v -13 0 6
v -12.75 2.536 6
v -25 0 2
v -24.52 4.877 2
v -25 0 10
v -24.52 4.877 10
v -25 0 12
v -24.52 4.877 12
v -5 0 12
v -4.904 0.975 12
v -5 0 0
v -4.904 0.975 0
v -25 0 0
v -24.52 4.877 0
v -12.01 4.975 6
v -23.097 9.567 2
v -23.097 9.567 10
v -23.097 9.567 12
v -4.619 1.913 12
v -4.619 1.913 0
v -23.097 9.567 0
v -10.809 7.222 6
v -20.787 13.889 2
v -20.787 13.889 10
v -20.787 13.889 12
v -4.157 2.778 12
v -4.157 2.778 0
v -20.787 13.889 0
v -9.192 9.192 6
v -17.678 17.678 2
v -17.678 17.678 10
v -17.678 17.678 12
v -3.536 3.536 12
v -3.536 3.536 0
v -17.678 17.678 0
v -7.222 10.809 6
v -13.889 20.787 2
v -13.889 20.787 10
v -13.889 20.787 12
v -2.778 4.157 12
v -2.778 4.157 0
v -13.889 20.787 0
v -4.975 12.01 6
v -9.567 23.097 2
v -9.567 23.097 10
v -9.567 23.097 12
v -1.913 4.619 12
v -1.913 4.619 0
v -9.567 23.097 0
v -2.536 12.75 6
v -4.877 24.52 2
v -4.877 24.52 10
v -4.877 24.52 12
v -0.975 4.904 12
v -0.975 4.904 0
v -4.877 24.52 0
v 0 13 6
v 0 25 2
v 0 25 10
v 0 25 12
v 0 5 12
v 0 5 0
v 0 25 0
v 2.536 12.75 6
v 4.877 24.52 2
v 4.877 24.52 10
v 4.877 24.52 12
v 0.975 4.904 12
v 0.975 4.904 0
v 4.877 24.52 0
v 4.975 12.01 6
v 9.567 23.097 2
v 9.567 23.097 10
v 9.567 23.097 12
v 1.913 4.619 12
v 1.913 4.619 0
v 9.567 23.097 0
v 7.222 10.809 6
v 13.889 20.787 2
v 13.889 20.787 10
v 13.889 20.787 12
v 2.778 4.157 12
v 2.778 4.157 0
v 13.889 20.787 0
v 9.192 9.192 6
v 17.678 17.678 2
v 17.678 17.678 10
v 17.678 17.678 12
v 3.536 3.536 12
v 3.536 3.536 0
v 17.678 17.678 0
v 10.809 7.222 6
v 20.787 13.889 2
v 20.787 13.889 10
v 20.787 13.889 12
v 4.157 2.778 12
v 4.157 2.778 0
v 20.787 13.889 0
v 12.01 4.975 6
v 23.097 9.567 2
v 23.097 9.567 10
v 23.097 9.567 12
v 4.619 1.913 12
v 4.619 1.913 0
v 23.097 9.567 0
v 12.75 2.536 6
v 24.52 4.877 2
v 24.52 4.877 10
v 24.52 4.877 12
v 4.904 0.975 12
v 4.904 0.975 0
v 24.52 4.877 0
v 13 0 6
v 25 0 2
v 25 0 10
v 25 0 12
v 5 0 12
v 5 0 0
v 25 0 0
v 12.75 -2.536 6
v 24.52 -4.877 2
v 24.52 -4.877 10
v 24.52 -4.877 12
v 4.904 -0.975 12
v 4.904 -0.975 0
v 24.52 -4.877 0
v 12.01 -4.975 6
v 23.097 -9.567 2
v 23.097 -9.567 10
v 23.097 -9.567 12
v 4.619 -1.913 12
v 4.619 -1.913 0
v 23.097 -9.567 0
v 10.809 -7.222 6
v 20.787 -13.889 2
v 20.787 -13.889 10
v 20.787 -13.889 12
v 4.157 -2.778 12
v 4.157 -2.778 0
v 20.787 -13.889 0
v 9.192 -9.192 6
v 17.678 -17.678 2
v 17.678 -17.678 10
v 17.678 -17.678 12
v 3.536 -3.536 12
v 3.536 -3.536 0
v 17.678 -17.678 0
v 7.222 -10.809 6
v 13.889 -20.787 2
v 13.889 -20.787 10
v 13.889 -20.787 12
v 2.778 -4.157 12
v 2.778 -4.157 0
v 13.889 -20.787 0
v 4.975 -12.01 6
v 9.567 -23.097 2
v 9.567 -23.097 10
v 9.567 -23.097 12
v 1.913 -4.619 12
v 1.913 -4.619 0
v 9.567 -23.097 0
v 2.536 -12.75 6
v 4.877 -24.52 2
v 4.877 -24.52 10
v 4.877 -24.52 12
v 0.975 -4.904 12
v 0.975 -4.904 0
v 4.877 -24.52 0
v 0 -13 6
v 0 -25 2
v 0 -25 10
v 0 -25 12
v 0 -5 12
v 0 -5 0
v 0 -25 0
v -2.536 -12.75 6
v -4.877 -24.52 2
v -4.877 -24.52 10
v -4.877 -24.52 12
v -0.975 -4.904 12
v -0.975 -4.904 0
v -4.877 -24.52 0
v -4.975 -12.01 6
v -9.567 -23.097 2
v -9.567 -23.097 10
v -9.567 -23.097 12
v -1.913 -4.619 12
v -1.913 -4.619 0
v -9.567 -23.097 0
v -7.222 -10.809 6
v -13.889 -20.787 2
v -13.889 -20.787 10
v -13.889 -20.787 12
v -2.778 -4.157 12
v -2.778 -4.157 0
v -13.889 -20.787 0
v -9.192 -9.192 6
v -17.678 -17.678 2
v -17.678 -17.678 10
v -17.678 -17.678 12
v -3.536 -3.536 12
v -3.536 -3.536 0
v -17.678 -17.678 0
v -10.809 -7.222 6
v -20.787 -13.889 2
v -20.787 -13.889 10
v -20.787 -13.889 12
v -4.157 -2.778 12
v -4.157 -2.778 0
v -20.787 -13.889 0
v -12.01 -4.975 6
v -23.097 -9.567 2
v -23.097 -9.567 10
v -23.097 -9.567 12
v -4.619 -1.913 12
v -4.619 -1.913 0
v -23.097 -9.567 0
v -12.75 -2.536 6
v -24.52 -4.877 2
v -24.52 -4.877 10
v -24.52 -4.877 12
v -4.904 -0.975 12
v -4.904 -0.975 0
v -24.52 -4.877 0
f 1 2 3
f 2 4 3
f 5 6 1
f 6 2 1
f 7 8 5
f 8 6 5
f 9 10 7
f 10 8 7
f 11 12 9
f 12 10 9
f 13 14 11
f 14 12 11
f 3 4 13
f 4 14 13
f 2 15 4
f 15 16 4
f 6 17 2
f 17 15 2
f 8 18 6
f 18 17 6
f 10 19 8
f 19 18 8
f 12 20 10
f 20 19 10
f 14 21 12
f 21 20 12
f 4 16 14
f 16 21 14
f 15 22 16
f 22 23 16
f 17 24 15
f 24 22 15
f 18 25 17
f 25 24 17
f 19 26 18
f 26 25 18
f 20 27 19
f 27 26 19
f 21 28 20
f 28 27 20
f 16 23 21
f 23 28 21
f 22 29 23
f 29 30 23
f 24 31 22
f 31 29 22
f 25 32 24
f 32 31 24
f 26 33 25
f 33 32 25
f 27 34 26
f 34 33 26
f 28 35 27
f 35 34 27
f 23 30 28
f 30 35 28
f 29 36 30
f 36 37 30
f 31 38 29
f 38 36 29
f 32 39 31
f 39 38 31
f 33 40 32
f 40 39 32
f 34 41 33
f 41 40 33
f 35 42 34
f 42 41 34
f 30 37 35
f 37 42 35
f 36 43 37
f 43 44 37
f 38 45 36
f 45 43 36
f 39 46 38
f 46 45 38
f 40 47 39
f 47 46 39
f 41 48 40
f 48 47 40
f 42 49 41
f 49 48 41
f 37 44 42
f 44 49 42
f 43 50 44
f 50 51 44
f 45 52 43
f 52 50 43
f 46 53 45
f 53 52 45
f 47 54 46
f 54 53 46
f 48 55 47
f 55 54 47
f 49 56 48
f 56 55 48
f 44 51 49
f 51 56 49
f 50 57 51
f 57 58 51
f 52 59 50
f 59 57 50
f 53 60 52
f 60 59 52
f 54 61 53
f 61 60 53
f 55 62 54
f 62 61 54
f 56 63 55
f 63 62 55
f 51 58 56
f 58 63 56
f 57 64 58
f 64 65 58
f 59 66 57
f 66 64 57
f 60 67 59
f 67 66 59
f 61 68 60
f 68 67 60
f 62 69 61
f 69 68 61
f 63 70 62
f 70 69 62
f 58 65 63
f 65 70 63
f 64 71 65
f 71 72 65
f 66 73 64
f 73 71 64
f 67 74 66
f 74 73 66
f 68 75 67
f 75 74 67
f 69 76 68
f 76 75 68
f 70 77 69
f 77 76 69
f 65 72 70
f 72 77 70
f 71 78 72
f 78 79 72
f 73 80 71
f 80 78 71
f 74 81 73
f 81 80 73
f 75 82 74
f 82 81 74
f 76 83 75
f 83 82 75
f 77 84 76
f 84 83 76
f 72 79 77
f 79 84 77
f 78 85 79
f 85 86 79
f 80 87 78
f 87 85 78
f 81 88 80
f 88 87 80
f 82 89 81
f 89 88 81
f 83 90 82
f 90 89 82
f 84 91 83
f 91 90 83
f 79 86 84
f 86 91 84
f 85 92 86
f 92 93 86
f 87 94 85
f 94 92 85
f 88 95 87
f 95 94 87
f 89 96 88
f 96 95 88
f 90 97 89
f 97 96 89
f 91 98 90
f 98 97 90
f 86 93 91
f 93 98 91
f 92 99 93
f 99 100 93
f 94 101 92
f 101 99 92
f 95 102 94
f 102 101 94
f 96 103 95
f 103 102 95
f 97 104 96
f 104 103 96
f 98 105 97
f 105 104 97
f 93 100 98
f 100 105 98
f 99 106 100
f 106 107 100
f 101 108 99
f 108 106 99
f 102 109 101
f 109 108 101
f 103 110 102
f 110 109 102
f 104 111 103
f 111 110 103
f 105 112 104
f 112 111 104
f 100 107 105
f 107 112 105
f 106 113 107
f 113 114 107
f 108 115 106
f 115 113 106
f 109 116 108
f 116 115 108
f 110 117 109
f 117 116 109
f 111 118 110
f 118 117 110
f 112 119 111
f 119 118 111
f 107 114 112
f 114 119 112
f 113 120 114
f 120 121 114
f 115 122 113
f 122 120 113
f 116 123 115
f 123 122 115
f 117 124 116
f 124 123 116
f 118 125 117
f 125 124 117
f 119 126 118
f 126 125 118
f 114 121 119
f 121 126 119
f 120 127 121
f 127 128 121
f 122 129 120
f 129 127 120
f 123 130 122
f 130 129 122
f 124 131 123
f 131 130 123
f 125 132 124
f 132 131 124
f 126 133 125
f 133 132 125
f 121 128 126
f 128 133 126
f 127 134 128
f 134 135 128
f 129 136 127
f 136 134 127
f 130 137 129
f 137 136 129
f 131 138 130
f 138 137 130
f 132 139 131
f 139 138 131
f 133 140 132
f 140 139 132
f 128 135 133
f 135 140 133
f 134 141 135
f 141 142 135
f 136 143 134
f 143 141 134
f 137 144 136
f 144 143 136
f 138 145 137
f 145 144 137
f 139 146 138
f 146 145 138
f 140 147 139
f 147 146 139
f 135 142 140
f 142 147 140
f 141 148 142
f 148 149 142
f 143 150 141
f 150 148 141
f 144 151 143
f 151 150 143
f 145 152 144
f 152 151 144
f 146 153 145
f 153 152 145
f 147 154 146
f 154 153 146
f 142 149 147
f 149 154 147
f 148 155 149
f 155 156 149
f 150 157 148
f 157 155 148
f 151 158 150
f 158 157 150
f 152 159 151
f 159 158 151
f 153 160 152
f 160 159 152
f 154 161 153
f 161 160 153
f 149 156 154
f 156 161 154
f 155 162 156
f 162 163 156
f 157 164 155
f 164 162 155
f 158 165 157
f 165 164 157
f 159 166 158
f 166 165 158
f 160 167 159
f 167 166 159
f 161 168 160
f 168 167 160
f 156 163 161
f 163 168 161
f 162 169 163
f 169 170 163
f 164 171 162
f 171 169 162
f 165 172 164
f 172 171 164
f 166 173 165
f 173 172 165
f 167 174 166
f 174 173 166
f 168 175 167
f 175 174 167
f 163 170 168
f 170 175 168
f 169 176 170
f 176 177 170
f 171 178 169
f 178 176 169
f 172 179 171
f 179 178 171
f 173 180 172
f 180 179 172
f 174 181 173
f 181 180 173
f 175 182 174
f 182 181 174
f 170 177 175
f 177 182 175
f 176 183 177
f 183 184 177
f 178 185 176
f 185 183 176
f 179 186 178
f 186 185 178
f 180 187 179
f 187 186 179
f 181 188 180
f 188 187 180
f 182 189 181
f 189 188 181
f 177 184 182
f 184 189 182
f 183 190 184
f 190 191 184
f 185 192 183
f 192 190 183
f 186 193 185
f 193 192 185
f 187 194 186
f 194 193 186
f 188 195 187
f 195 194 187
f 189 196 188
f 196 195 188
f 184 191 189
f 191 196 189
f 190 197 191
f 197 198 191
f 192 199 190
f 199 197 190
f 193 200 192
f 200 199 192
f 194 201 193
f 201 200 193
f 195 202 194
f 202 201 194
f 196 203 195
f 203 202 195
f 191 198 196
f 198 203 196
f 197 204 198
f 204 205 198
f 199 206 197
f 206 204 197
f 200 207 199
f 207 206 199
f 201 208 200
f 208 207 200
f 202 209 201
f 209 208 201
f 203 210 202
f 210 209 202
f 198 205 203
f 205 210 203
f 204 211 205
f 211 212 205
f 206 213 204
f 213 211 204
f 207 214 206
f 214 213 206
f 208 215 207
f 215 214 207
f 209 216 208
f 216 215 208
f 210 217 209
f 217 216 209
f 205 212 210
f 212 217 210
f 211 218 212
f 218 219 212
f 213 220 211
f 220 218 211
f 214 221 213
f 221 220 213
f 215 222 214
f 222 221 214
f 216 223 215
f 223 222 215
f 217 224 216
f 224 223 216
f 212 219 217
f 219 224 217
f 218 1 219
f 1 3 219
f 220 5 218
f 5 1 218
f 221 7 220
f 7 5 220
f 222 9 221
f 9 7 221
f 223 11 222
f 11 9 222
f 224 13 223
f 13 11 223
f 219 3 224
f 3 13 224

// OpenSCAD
$fn = 32;

// ----------------------------------------------------------------------
// Revolved part: V-groove pulley R25
// ----------------------------------------------------------------------

// --- parameters (mm) ---
bore_r = 5;               // bore radius
rim_r = 25;               // rim radius
rim_t = 12;               // rim width
groove_r = 13;            // groove root radius
groove_w = 4;             // groove half width
revolve_angle = 360;      // revolve sweep, degrees

bore_d = 2 * bore_r;
rim_d = 2 * rim_r;
groove_d = 2 * groove_r;

profile = [[5, 0], [25, 0], [25, 2], [13, 6], [25, 10], [25, 12], [5, 12]];  // primary outline, 7 points, counter clockwise

// --- the one profile operation ---
rotate_extrude(angle = revolve_angle) polygon(points = profile);
